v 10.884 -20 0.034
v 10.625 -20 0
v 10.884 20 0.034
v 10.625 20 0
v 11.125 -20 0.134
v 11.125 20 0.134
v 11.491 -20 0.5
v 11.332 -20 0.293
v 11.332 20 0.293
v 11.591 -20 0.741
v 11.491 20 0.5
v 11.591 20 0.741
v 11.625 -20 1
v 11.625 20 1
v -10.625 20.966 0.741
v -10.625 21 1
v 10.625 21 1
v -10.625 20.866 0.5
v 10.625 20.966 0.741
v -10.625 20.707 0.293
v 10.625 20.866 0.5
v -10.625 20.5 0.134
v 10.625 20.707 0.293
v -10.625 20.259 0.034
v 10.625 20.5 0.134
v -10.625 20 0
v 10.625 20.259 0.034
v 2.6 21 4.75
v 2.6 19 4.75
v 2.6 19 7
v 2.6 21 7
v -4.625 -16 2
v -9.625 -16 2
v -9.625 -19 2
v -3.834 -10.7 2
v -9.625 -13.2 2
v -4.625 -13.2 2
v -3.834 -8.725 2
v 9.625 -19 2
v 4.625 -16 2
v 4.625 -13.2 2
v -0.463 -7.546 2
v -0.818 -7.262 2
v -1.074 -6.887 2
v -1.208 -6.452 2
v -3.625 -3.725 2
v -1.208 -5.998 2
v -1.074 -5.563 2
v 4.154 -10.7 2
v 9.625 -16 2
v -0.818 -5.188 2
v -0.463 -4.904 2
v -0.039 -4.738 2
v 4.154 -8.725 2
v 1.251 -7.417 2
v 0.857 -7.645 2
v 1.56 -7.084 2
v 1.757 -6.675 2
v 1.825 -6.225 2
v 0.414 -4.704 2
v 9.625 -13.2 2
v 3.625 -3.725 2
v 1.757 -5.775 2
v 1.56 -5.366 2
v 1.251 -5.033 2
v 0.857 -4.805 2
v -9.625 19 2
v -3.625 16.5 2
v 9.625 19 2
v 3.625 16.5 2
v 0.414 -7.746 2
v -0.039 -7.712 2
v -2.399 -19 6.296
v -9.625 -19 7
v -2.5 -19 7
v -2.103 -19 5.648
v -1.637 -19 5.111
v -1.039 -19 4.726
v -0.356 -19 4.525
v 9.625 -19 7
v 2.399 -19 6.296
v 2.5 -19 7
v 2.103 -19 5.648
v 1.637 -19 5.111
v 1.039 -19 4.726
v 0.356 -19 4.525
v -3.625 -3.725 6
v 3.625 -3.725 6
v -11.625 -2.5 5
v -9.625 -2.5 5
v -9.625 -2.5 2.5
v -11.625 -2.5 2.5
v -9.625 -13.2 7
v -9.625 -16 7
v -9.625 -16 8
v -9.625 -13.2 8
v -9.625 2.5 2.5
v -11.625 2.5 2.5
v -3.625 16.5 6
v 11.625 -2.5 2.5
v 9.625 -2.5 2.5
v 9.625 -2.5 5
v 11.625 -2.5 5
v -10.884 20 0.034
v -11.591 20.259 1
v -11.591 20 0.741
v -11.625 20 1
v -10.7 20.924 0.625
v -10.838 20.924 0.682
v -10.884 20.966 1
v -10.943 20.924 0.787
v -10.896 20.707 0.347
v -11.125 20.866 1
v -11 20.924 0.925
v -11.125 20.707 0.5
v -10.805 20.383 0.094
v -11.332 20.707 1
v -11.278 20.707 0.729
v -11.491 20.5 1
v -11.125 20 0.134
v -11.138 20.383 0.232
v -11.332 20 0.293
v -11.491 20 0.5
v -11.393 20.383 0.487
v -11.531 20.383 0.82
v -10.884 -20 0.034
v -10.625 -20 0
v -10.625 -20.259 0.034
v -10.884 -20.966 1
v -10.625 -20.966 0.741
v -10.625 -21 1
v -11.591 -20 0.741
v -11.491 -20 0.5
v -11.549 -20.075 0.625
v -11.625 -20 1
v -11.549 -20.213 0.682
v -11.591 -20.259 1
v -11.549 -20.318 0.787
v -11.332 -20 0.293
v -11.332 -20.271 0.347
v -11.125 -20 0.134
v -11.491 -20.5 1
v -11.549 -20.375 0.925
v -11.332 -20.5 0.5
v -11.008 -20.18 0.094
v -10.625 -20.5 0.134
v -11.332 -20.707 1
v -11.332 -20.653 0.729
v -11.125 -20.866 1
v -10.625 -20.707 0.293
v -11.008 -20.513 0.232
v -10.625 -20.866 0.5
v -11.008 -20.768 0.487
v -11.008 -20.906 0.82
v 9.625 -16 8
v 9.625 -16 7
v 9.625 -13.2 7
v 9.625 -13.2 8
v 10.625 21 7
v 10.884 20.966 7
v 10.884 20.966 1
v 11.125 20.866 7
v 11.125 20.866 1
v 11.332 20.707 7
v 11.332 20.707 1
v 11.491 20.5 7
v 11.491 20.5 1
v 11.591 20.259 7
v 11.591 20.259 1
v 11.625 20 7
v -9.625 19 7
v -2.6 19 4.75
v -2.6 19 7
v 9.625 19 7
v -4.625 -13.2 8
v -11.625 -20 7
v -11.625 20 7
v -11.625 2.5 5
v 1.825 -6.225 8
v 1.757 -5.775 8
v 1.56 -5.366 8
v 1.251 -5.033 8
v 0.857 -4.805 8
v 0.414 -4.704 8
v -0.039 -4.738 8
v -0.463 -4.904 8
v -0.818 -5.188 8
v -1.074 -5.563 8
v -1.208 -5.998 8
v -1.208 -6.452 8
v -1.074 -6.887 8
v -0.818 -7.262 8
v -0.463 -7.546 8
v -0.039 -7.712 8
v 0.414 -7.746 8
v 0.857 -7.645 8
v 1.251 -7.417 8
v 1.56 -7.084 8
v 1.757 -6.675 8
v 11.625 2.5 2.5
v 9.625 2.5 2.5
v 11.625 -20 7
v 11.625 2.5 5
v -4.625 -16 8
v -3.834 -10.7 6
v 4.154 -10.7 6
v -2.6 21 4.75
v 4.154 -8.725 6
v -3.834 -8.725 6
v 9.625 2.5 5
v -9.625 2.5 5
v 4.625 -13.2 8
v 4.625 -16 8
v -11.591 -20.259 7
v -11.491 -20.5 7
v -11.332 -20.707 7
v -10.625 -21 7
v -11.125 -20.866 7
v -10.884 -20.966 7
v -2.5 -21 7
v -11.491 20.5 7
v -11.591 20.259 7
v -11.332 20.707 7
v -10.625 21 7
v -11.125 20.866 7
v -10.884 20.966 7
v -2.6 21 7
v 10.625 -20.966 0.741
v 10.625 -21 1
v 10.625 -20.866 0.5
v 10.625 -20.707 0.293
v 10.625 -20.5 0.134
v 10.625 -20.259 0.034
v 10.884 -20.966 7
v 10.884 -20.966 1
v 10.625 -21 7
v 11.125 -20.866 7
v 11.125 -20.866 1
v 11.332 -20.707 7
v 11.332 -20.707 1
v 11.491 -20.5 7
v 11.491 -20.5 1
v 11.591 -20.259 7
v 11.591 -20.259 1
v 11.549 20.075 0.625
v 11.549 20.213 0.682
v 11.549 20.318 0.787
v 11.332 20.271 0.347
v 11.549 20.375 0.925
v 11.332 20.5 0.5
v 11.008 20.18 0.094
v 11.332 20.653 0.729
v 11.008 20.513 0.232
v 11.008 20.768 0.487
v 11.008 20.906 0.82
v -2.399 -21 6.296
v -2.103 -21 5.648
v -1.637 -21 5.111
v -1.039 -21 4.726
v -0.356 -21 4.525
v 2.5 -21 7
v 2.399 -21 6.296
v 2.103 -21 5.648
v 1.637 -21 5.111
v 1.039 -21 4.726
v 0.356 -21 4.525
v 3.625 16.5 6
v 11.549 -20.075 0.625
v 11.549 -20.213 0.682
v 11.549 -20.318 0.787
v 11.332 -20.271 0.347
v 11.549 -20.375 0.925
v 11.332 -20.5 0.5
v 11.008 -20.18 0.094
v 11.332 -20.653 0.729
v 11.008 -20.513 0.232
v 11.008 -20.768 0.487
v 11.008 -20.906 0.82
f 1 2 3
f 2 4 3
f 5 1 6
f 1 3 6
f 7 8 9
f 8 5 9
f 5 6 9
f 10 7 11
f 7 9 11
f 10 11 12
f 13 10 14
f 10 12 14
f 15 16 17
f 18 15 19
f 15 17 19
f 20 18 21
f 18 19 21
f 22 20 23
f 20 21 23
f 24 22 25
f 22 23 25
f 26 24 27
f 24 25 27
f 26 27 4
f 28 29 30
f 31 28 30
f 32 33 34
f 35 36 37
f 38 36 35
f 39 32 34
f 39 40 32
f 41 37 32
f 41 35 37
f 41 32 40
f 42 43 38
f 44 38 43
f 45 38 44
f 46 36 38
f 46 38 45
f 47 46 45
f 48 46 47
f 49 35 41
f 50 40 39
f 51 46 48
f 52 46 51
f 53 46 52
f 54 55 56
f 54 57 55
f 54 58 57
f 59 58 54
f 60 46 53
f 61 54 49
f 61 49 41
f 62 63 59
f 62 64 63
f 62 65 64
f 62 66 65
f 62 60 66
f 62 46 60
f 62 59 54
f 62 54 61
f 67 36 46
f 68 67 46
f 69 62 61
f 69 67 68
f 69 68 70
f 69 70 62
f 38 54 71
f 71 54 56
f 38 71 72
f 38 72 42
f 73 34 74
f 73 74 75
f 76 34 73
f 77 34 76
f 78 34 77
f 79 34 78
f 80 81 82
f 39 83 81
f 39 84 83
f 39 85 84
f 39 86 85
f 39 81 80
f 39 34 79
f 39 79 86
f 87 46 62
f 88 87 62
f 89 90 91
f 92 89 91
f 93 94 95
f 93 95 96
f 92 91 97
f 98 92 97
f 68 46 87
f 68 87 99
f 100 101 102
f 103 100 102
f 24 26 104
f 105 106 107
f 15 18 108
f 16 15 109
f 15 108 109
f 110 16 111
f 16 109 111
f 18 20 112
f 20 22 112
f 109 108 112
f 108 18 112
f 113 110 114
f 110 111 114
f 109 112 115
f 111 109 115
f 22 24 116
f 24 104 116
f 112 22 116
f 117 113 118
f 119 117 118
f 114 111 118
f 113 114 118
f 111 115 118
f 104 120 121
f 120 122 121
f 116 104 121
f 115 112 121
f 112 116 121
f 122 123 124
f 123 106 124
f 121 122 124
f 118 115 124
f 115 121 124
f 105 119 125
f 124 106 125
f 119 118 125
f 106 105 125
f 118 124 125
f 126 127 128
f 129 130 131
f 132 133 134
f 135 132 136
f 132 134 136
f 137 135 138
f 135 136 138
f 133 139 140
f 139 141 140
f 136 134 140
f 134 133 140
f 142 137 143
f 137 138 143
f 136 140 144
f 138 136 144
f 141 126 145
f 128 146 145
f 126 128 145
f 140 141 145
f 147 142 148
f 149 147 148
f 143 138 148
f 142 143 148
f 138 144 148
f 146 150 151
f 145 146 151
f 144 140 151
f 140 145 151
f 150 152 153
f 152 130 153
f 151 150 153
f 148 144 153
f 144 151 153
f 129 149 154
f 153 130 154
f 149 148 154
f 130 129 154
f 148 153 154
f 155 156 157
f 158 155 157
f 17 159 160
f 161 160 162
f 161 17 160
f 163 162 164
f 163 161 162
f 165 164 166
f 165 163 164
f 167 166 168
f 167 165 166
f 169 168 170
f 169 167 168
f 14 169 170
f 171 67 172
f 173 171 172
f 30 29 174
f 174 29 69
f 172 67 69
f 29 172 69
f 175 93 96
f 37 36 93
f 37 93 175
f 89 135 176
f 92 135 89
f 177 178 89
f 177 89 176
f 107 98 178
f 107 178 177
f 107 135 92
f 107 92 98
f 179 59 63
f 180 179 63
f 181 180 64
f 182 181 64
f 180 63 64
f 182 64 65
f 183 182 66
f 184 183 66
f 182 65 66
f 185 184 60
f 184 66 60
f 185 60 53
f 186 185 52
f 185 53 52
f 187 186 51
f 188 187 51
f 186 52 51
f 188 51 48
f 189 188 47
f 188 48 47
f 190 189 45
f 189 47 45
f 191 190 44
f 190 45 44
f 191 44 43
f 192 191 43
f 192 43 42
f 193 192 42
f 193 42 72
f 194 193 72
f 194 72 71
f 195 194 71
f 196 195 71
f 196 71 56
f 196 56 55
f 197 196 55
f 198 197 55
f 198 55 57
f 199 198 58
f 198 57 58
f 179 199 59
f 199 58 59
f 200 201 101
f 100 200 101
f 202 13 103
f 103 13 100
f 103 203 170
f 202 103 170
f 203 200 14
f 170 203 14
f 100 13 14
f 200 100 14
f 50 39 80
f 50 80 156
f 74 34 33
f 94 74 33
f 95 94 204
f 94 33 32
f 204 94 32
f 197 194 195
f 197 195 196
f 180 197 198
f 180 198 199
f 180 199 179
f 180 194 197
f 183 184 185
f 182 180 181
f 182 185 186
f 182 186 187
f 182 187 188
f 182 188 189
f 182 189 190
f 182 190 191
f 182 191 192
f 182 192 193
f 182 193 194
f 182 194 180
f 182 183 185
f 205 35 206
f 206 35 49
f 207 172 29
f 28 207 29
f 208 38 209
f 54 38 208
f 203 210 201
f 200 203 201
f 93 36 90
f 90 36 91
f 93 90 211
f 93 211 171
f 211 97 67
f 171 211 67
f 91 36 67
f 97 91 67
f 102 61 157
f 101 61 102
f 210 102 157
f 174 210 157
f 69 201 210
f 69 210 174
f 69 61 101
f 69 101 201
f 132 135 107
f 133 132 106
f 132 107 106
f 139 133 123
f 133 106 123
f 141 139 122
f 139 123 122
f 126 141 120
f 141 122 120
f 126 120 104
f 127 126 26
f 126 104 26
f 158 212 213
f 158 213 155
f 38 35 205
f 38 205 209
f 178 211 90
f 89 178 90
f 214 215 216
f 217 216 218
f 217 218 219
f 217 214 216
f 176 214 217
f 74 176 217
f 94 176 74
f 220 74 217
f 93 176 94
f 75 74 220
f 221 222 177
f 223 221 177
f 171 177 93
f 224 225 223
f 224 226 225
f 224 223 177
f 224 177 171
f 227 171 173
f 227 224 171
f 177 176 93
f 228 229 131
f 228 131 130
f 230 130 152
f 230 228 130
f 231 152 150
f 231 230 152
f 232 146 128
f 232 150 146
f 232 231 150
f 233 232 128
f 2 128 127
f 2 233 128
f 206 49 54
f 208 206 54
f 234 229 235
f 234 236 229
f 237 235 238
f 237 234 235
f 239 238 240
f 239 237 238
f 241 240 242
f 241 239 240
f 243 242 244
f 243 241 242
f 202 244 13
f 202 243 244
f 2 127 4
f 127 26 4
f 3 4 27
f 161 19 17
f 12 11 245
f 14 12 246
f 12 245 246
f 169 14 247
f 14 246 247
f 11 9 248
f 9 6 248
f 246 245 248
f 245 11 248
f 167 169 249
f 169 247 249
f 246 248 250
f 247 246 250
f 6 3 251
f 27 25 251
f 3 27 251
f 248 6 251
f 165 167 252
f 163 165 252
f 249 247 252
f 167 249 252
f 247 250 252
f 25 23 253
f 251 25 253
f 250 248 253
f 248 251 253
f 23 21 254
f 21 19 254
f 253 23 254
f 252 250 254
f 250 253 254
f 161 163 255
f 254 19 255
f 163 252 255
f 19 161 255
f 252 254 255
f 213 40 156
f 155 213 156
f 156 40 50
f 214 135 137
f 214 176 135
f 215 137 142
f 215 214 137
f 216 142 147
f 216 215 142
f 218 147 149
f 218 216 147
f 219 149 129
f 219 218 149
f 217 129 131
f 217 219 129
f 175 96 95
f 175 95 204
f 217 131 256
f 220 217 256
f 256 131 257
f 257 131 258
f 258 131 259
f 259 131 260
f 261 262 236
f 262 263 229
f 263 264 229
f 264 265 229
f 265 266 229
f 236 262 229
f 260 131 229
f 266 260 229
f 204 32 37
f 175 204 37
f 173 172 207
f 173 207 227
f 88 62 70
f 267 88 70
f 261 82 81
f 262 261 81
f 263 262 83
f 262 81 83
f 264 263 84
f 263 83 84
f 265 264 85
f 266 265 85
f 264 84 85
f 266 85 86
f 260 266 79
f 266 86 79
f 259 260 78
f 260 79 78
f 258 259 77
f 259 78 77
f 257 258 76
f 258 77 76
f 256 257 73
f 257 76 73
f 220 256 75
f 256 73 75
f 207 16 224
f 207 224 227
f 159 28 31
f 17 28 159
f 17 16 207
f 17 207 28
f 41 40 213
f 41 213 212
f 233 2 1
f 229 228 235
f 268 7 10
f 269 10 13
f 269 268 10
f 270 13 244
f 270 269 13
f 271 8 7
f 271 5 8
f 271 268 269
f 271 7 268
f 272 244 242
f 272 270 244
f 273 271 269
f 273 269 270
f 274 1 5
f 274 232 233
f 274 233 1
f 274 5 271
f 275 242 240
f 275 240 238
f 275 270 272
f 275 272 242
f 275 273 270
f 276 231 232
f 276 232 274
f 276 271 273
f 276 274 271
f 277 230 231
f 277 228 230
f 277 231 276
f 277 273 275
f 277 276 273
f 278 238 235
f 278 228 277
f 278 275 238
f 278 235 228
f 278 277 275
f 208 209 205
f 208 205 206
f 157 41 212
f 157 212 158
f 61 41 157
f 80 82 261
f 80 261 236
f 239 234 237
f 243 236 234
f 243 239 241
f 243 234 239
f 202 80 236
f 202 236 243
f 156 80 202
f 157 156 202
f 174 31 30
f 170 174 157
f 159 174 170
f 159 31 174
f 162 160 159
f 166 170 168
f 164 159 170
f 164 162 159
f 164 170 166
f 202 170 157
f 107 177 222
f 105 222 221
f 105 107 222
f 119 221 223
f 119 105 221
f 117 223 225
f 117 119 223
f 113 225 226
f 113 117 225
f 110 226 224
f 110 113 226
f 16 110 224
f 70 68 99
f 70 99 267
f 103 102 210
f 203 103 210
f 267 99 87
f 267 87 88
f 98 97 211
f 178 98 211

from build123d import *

# Parameters (mm, degrees)
SKETCH1_W           = 23.25
SKETCH1_H           = 42
BOSS_EXTRUDE1_DEPTH = 2
SKETCH2_W           = 23.25
SKETCH2_H           = 42
SKETCH2_W_2         = 19.25
SKETCH2_H_2         = 38
BOSS_EXTRUDE2_DEPTH = 5
SKETCH3_R           = 1.525
SKETCH3_W           = 5
SKETCH3_H           = 2.8
BOSS_EXTRUDE3_DEPTH = 6
SKETCH4_W           = 7.25
SKETCH4_H           = 20.225
SKETCH4_W_2         = 7.988530752
SKETCH4_H_2         = 1.975
BOSS_EXTRUDE4_DEPTH = 4
SKETCH5_W           = 5.2
SKETCH5_H           = 4.5
CUT_EXTRUDE1_DEPTH  = 3
CUT_EXTRUDE3_DEPTH  = 3
CUT_EXTRUDE4_DEPTH  = 3
CUT_EXTRUDE5_DEPTH  = 3
FILLET1_R           = 1


with BuildPart() as part:
    # Sketch1 → Boss-Extrude1 (new body)
    with BuildSketch(Plane.XY):
        Rectangle(SKETCH1_W, SKETCH1_H)
    extrude(amount=BOSS_EXTRUDE1_DEPTH)

    # Sketch2 → Boss-Extrude2 (add)
    with BuildSketch(Plane.XY.offset(2)):
        Rectangle(SKETCH2_W, SKETCH2_H)
        Rectangle(SKETCH2_W_2, SKETCH2_H_2, mode=Mode.SUBTRACT)
    extrude(amount=BOSS_EXTRUDE2_DEPTH)

    # Sketch3 → Boss-Extrude3 (add)
    with BuildSketch(Plane.XY.offset(2)):
        with Locations((0.3, -6.225)):
            Circle(SKETCH3_R)
        with Locations((-7.125, -14.6)):
            Rectangle(SKETCH3_W, SKETCH3_H)
        with Locations((7.125, -14.6)):
            Rectangle(SKETCH3_W, SKETCH3_H)
    extrude(amount=BOSS_EXTRUDE3_DEPTH)

    # Sketch4 → Boss-Extrude4 (add)
    with BuildSketch(Plane.XY.offset(2)):
        with Locations((0, 6.3875)):
            Rectangle(SKETCH4_W, SKETCH4_H)
        with Locations((0.159770615, -9.7125)):
            Rectangle(SKETCH4_W_2, SKETCH4_H_2)
    extrude(amount=BOSS_EXTRUDE4_DEPTH)

    # Sketch5 → Cut-Extrude1 (cut, through all)
    with BuildSketch(Plane.XZ.offset(-19)):
        with Locations((0, 7)):
            Rectangle(SKETCH5_W, SKETCH5_H)
    extrude(amount=-CUT_EXTRUDE1_DEPTH, mode=Mode.SUBTRACT)

    # Sketch6 → Cut-Extrude3 (cut, through all)
    with BuildSketch(Plane(origin=(0, -19, 0), x_dir=(1, 0, 0), z_dir=(0, 1, 0))):
        with BuildLine():
            Line((-2.5, -7), (2.5, -7))
            ThreePointArc((2.5, -7), (0, -4.5), (-2.5, -7))
        make_face()
    extrude(amount=-CUT_EXTRUDE3_DEPTH, mode=Mode.SUBTRACT)

    # Sketch7 → Cut-Extrude4 (cut, through all)
    with BuildSketch(Plane(origin=(-9.625, 0, 0), x_dir=(0, 0, -1), z_dir=(1, 0, 0))):
        Polygon((-2.5, 0), (-2.5, 2.5), (-5, 2.5), (-5, -2.5), (-2.5, -2.5), align=None)
    extrude(amount=-CUT_EXTRUDE4_DEPTH, mode=Mode.SUBTRACT)

    # Sketch8 → Cut-Extrude5 (cut, through all)
    with BuildSketch(Plane.ZY.offset(-9.625)):
        Polygon((2.5, 0), (2.5, -2.5), (5, -2.5), (5, 2.5), (2.5, 2.5), align=None)
    extrude(amount=-CUT_EXTRUDE5_DEPTH, mode=Mode.SUBTRACT)

    # Fillet1
    fillet1_edges = [part.edges().sort_by_distance(p)[0] for p in [
        (0, -21, 0),
        (-11.625, 0, 0),
        (0, 21, 0),
        (11.625, 0, 0),
        (11.625, -21, 3.5),
        (-11.625, -21, 3.5),
        (-11.625, 21, 3.5),
        (11.625, 21, 3.5),
    ]]
    fillet(fillet1_edges, radius=FILLET1_R)


solid = part.part
